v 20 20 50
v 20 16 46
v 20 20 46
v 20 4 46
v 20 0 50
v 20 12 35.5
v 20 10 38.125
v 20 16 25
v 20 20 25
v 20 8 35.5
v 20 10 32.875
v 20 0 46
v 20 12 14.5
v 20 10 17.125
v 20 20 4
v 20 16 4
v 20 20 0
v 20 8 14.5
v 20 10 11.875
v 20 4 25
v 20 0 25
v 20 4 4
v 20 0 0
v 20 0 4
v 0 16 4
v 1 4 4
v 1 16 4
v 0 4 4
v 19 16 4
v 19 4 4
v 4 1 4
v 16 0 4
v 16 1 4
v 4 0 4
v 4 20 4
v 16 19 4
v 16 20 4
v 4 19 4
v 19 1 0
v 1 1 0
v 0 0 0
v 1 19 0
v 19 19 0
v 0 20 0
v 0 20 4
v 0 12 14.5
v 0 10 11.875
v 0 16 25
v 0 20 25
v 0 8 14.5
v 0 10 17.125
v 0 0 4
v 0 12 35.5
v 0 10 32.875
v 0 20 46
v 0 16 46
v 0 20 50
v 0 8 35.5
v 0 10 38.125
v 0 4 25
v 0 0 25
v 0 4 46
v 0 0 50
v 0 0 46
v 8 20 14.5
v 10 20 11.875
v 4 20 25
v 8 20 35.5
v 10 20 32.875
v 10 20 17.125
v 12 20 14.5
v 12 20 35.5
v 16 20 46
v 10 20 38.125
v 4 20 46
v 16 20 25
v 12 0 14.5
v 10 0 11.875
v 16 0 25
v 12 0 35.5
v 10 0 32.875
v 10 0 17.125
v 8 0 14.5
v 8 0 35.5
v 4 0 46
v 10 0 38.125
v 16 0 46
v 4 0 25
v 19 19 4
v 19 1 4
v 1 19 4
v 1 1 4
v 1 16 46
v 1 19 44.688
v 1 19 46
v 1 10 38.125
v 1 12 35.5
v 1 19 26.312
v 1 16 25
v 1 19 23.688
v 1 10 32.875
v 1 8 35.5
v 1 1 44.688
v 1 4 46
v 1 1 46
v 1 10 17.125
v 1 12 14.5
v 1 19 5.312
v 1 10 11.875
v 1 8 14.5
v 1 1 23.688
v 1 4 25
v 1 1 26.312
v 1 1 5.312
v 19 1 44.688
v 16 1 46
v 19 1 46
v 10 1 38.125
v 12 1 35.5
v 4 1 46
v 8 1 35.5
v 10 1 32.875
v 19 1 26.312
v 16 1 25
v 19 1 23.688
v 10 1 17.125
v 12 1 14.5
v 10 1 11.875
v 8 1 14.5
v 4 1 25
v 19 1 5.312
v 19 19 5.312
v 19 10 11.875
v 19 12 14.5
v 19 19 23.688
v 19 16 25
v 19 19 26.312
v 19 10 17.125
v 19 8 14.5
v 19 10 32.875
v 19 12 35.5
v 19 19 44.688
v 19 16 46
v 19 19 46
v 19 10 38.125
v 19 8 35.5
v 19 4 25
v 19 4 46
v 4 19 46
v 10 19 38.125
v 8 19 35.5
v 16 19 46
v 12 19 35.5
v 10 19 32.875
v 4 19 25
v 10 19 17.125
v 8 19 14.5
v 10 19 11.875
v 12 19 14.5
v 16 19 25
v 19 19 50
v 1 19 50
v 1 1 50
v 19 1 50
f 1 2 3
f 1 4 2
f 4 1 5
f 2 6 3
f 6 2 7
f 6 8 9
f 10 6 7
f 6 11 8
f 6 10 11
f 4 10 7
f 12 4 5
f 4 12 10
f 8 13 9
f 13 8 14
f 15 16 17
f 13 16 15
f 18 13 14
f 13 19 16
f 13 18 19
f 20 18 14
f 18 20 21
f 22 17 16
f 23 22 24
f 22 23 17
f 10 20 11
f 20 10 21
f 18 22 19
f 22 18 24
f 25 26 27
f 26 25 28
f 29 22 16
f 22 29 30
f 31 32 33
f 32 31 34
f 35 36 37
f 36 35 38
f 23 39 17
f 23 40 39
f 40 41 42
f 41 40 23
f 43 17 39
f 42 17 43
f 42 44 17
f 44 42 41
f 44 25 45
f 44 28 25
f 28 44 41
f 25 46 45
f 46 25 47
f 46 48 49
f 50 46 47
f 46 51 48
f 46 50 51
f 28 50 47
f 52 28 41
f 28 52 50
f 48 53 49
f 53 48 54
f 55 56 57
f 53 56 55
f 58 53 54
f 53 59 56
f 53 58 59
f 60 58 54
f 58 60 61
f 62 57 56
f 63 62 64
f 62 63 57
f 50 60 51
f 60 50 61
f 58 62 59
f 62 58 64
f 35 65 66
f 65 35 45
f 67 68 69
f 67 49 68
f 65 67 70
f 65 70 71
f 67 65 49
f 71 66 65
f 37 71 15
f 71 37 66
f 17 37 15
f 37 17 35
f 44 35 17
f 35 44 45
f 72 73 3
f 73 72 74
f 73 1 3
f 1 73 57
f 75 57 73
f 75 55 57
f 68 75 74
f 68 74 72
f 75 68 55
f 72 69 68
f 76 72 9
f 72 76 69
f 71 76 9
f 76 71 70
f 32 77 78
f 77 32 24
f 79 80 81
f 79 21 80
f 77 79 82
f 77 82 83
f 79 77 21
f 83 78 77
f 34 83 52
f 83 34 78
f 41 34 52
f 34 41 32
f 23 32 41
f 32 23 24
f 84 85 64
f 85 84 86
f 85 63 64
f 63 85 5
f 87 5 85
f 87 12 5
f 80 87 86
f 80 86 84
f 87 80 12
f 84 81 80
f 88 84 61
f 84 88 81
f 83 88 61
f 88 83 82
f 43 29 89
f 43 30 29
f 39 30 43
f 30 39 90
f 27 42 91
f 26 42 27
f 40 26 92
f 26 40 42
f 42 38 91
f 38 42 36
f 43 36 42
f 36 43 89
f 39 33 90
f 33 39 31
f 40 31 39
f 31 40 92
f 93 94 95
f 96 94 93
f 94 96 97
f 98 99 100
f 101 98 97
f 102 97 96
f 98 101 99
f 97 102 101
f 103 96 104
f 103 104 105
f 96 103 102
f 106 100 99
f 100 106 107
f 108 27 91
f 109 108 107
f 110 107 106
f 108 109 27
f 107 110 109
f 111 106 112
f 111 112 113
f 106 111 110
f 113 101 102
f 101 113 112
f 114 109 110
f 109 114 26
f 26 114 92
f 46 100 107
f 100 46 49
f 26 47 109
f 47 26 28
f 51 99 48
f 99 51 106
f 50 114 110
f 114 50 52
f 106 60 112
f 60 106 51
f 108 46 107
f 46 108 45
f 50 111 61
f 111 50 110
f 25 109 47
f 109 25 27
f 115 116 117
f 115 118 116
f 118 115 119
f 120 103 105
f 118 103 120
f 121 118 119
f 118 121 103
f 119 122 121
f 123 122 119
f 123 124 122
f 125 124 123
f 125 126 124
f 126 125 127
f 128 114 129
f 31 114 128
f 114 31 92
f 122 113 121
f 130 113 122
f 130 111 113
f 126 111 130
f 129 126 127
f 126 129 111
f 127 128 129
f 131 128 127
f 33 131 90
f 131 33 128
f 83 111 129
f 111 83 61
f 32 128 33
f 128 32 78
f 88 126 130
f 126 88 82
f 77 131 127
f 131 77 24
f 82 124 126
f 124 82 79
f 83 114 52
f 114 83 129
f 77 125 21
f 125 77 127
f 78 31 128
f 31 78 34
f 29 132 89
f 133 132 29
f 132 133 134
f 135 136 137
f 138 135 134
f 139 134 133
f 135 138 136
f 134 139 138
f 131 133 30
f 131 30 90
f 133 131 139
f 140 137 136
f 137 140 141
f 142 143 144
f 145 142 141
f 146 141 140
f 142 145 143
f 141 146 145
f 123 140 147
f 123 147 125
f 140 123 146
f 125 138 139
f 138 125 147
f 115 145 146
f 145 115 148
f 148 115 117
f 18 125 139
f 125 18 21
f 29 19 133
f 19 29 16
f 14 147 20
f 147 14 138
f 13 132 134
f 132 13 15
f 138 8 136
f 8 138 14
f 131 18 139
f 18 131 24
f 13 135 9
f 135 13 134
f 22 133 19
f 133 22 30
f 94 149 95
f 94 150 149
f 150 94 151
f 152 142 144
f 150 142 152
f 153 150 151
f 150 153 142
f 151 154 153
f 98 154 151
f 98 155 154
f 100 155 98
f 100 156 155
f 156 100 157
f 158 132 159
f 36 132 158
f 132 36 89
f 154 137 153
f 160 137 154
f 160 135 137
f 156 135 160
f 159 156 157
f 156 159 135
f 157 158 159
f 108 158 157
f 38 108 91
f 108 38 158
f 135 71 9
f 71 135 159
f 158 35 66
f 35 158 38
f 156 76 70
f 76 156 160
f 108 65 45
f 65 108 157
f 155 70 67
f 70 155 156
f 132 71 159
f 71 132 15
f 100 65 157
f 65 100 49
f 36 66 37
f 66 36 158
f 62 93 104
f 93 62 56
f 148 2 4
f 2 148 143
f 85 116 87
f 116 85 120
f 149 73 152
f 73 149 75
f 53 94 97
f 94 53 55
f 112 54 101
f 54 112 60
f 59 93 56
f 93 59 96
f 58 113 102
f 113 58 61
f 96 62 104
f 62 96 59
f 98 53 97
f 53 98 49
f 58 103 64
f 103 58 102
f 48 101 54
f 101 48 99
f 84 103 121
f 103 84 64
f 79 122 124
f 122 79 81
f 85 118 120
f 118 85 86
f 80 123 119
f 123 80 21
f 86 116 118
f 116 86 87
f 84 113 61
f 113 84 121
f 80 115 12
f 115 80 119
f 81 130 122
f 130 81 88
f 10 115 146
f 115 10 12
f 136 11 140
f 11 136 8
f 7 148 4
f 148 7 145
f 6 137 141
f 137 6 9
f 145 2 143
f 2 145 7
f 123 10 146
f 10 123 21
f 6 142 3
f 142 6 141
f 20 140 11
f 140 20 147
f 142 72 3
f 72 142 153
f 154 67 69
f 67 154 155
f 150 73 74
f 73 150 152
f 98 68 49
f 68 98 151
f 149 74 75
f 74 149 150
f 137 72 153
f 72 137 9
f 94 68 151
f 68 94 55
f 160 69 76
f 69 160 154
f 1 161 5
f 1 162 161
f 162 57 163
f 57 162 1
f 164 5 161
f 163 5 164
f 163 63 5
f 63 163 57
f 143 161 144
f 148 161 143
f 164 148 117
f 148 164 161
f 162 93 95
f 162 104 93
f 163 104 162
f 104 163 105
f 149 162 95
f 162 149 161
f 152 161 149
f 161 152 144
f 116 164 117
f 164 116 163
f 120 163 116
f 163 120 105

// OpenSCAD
tubeSize=20;
tubeThickness=1;
segmentSize=4;

tubeLength=50;
numSegments=2;

/*skew takes an array of six angles:
 *x along y
 *x along z
 *y along x
 *y along z
 *z along x
 *z along y
 */
module skew(dims) {
matrix = [
    [ 1, dims[0]/45, dims[1]/45, 0 ],
    [ dims[2]/45, 1, dims[4]/45, 0 ],
    [ dims[5]/45, dims[3]/45, 1, 0 ],
    [ 0, 0, 0, 1 ]
];
multmatrix(matrix)
children();
}



module base() {
    difference() {
        cube([tubeSize, tubeSize, segmentSize]);
        translate([tubeThickness, tubeThickness, 0])   
            cube([tubeSize-(tubeThickness*2), tubeSize-(tubeThickness*2), segmentSize]);
    }
}

module wall(h) {
    x=tubeSize-segmentSize;
    a = (x/h)*45;

    skew([0, 0, 0, 0, a, 0])
        cube([tubeThickness, segmentSize, h]);

    translate([tubeThickness, tubeSize, 0]) 
        rotate([0,0,180])
            skew([0, 0, 0, 0, a, 0])
                cube([tubeThickness, segmentSize, h]);
}

module section(h) {
    wall(h);
    
    translate([tubeSize, 0, 0])
        rotate([0, 0, 90])
            wall(h);

    translate([tubeSize, tubeSize, 0])
        rotate([0, 0, 180])
            wall(h);

    translate([0, tubeSize, 0])
        rotate([0, 0, -90])
            wall(h);
}

module tube(h, nsects) {
    htop = h-segmentSize;
    hsect = (h-(segmentSize*2))/nsects;

    *cube([tubeSize, tubeSize, h]);

    base();

    for(i = [segmentSize : hsect : htop-1])
        translate([0, 0, i]) 
            section(hsect);
    
    translate([0, 0, htop])
        base();
}

tube(tubeLength, numSegments);
